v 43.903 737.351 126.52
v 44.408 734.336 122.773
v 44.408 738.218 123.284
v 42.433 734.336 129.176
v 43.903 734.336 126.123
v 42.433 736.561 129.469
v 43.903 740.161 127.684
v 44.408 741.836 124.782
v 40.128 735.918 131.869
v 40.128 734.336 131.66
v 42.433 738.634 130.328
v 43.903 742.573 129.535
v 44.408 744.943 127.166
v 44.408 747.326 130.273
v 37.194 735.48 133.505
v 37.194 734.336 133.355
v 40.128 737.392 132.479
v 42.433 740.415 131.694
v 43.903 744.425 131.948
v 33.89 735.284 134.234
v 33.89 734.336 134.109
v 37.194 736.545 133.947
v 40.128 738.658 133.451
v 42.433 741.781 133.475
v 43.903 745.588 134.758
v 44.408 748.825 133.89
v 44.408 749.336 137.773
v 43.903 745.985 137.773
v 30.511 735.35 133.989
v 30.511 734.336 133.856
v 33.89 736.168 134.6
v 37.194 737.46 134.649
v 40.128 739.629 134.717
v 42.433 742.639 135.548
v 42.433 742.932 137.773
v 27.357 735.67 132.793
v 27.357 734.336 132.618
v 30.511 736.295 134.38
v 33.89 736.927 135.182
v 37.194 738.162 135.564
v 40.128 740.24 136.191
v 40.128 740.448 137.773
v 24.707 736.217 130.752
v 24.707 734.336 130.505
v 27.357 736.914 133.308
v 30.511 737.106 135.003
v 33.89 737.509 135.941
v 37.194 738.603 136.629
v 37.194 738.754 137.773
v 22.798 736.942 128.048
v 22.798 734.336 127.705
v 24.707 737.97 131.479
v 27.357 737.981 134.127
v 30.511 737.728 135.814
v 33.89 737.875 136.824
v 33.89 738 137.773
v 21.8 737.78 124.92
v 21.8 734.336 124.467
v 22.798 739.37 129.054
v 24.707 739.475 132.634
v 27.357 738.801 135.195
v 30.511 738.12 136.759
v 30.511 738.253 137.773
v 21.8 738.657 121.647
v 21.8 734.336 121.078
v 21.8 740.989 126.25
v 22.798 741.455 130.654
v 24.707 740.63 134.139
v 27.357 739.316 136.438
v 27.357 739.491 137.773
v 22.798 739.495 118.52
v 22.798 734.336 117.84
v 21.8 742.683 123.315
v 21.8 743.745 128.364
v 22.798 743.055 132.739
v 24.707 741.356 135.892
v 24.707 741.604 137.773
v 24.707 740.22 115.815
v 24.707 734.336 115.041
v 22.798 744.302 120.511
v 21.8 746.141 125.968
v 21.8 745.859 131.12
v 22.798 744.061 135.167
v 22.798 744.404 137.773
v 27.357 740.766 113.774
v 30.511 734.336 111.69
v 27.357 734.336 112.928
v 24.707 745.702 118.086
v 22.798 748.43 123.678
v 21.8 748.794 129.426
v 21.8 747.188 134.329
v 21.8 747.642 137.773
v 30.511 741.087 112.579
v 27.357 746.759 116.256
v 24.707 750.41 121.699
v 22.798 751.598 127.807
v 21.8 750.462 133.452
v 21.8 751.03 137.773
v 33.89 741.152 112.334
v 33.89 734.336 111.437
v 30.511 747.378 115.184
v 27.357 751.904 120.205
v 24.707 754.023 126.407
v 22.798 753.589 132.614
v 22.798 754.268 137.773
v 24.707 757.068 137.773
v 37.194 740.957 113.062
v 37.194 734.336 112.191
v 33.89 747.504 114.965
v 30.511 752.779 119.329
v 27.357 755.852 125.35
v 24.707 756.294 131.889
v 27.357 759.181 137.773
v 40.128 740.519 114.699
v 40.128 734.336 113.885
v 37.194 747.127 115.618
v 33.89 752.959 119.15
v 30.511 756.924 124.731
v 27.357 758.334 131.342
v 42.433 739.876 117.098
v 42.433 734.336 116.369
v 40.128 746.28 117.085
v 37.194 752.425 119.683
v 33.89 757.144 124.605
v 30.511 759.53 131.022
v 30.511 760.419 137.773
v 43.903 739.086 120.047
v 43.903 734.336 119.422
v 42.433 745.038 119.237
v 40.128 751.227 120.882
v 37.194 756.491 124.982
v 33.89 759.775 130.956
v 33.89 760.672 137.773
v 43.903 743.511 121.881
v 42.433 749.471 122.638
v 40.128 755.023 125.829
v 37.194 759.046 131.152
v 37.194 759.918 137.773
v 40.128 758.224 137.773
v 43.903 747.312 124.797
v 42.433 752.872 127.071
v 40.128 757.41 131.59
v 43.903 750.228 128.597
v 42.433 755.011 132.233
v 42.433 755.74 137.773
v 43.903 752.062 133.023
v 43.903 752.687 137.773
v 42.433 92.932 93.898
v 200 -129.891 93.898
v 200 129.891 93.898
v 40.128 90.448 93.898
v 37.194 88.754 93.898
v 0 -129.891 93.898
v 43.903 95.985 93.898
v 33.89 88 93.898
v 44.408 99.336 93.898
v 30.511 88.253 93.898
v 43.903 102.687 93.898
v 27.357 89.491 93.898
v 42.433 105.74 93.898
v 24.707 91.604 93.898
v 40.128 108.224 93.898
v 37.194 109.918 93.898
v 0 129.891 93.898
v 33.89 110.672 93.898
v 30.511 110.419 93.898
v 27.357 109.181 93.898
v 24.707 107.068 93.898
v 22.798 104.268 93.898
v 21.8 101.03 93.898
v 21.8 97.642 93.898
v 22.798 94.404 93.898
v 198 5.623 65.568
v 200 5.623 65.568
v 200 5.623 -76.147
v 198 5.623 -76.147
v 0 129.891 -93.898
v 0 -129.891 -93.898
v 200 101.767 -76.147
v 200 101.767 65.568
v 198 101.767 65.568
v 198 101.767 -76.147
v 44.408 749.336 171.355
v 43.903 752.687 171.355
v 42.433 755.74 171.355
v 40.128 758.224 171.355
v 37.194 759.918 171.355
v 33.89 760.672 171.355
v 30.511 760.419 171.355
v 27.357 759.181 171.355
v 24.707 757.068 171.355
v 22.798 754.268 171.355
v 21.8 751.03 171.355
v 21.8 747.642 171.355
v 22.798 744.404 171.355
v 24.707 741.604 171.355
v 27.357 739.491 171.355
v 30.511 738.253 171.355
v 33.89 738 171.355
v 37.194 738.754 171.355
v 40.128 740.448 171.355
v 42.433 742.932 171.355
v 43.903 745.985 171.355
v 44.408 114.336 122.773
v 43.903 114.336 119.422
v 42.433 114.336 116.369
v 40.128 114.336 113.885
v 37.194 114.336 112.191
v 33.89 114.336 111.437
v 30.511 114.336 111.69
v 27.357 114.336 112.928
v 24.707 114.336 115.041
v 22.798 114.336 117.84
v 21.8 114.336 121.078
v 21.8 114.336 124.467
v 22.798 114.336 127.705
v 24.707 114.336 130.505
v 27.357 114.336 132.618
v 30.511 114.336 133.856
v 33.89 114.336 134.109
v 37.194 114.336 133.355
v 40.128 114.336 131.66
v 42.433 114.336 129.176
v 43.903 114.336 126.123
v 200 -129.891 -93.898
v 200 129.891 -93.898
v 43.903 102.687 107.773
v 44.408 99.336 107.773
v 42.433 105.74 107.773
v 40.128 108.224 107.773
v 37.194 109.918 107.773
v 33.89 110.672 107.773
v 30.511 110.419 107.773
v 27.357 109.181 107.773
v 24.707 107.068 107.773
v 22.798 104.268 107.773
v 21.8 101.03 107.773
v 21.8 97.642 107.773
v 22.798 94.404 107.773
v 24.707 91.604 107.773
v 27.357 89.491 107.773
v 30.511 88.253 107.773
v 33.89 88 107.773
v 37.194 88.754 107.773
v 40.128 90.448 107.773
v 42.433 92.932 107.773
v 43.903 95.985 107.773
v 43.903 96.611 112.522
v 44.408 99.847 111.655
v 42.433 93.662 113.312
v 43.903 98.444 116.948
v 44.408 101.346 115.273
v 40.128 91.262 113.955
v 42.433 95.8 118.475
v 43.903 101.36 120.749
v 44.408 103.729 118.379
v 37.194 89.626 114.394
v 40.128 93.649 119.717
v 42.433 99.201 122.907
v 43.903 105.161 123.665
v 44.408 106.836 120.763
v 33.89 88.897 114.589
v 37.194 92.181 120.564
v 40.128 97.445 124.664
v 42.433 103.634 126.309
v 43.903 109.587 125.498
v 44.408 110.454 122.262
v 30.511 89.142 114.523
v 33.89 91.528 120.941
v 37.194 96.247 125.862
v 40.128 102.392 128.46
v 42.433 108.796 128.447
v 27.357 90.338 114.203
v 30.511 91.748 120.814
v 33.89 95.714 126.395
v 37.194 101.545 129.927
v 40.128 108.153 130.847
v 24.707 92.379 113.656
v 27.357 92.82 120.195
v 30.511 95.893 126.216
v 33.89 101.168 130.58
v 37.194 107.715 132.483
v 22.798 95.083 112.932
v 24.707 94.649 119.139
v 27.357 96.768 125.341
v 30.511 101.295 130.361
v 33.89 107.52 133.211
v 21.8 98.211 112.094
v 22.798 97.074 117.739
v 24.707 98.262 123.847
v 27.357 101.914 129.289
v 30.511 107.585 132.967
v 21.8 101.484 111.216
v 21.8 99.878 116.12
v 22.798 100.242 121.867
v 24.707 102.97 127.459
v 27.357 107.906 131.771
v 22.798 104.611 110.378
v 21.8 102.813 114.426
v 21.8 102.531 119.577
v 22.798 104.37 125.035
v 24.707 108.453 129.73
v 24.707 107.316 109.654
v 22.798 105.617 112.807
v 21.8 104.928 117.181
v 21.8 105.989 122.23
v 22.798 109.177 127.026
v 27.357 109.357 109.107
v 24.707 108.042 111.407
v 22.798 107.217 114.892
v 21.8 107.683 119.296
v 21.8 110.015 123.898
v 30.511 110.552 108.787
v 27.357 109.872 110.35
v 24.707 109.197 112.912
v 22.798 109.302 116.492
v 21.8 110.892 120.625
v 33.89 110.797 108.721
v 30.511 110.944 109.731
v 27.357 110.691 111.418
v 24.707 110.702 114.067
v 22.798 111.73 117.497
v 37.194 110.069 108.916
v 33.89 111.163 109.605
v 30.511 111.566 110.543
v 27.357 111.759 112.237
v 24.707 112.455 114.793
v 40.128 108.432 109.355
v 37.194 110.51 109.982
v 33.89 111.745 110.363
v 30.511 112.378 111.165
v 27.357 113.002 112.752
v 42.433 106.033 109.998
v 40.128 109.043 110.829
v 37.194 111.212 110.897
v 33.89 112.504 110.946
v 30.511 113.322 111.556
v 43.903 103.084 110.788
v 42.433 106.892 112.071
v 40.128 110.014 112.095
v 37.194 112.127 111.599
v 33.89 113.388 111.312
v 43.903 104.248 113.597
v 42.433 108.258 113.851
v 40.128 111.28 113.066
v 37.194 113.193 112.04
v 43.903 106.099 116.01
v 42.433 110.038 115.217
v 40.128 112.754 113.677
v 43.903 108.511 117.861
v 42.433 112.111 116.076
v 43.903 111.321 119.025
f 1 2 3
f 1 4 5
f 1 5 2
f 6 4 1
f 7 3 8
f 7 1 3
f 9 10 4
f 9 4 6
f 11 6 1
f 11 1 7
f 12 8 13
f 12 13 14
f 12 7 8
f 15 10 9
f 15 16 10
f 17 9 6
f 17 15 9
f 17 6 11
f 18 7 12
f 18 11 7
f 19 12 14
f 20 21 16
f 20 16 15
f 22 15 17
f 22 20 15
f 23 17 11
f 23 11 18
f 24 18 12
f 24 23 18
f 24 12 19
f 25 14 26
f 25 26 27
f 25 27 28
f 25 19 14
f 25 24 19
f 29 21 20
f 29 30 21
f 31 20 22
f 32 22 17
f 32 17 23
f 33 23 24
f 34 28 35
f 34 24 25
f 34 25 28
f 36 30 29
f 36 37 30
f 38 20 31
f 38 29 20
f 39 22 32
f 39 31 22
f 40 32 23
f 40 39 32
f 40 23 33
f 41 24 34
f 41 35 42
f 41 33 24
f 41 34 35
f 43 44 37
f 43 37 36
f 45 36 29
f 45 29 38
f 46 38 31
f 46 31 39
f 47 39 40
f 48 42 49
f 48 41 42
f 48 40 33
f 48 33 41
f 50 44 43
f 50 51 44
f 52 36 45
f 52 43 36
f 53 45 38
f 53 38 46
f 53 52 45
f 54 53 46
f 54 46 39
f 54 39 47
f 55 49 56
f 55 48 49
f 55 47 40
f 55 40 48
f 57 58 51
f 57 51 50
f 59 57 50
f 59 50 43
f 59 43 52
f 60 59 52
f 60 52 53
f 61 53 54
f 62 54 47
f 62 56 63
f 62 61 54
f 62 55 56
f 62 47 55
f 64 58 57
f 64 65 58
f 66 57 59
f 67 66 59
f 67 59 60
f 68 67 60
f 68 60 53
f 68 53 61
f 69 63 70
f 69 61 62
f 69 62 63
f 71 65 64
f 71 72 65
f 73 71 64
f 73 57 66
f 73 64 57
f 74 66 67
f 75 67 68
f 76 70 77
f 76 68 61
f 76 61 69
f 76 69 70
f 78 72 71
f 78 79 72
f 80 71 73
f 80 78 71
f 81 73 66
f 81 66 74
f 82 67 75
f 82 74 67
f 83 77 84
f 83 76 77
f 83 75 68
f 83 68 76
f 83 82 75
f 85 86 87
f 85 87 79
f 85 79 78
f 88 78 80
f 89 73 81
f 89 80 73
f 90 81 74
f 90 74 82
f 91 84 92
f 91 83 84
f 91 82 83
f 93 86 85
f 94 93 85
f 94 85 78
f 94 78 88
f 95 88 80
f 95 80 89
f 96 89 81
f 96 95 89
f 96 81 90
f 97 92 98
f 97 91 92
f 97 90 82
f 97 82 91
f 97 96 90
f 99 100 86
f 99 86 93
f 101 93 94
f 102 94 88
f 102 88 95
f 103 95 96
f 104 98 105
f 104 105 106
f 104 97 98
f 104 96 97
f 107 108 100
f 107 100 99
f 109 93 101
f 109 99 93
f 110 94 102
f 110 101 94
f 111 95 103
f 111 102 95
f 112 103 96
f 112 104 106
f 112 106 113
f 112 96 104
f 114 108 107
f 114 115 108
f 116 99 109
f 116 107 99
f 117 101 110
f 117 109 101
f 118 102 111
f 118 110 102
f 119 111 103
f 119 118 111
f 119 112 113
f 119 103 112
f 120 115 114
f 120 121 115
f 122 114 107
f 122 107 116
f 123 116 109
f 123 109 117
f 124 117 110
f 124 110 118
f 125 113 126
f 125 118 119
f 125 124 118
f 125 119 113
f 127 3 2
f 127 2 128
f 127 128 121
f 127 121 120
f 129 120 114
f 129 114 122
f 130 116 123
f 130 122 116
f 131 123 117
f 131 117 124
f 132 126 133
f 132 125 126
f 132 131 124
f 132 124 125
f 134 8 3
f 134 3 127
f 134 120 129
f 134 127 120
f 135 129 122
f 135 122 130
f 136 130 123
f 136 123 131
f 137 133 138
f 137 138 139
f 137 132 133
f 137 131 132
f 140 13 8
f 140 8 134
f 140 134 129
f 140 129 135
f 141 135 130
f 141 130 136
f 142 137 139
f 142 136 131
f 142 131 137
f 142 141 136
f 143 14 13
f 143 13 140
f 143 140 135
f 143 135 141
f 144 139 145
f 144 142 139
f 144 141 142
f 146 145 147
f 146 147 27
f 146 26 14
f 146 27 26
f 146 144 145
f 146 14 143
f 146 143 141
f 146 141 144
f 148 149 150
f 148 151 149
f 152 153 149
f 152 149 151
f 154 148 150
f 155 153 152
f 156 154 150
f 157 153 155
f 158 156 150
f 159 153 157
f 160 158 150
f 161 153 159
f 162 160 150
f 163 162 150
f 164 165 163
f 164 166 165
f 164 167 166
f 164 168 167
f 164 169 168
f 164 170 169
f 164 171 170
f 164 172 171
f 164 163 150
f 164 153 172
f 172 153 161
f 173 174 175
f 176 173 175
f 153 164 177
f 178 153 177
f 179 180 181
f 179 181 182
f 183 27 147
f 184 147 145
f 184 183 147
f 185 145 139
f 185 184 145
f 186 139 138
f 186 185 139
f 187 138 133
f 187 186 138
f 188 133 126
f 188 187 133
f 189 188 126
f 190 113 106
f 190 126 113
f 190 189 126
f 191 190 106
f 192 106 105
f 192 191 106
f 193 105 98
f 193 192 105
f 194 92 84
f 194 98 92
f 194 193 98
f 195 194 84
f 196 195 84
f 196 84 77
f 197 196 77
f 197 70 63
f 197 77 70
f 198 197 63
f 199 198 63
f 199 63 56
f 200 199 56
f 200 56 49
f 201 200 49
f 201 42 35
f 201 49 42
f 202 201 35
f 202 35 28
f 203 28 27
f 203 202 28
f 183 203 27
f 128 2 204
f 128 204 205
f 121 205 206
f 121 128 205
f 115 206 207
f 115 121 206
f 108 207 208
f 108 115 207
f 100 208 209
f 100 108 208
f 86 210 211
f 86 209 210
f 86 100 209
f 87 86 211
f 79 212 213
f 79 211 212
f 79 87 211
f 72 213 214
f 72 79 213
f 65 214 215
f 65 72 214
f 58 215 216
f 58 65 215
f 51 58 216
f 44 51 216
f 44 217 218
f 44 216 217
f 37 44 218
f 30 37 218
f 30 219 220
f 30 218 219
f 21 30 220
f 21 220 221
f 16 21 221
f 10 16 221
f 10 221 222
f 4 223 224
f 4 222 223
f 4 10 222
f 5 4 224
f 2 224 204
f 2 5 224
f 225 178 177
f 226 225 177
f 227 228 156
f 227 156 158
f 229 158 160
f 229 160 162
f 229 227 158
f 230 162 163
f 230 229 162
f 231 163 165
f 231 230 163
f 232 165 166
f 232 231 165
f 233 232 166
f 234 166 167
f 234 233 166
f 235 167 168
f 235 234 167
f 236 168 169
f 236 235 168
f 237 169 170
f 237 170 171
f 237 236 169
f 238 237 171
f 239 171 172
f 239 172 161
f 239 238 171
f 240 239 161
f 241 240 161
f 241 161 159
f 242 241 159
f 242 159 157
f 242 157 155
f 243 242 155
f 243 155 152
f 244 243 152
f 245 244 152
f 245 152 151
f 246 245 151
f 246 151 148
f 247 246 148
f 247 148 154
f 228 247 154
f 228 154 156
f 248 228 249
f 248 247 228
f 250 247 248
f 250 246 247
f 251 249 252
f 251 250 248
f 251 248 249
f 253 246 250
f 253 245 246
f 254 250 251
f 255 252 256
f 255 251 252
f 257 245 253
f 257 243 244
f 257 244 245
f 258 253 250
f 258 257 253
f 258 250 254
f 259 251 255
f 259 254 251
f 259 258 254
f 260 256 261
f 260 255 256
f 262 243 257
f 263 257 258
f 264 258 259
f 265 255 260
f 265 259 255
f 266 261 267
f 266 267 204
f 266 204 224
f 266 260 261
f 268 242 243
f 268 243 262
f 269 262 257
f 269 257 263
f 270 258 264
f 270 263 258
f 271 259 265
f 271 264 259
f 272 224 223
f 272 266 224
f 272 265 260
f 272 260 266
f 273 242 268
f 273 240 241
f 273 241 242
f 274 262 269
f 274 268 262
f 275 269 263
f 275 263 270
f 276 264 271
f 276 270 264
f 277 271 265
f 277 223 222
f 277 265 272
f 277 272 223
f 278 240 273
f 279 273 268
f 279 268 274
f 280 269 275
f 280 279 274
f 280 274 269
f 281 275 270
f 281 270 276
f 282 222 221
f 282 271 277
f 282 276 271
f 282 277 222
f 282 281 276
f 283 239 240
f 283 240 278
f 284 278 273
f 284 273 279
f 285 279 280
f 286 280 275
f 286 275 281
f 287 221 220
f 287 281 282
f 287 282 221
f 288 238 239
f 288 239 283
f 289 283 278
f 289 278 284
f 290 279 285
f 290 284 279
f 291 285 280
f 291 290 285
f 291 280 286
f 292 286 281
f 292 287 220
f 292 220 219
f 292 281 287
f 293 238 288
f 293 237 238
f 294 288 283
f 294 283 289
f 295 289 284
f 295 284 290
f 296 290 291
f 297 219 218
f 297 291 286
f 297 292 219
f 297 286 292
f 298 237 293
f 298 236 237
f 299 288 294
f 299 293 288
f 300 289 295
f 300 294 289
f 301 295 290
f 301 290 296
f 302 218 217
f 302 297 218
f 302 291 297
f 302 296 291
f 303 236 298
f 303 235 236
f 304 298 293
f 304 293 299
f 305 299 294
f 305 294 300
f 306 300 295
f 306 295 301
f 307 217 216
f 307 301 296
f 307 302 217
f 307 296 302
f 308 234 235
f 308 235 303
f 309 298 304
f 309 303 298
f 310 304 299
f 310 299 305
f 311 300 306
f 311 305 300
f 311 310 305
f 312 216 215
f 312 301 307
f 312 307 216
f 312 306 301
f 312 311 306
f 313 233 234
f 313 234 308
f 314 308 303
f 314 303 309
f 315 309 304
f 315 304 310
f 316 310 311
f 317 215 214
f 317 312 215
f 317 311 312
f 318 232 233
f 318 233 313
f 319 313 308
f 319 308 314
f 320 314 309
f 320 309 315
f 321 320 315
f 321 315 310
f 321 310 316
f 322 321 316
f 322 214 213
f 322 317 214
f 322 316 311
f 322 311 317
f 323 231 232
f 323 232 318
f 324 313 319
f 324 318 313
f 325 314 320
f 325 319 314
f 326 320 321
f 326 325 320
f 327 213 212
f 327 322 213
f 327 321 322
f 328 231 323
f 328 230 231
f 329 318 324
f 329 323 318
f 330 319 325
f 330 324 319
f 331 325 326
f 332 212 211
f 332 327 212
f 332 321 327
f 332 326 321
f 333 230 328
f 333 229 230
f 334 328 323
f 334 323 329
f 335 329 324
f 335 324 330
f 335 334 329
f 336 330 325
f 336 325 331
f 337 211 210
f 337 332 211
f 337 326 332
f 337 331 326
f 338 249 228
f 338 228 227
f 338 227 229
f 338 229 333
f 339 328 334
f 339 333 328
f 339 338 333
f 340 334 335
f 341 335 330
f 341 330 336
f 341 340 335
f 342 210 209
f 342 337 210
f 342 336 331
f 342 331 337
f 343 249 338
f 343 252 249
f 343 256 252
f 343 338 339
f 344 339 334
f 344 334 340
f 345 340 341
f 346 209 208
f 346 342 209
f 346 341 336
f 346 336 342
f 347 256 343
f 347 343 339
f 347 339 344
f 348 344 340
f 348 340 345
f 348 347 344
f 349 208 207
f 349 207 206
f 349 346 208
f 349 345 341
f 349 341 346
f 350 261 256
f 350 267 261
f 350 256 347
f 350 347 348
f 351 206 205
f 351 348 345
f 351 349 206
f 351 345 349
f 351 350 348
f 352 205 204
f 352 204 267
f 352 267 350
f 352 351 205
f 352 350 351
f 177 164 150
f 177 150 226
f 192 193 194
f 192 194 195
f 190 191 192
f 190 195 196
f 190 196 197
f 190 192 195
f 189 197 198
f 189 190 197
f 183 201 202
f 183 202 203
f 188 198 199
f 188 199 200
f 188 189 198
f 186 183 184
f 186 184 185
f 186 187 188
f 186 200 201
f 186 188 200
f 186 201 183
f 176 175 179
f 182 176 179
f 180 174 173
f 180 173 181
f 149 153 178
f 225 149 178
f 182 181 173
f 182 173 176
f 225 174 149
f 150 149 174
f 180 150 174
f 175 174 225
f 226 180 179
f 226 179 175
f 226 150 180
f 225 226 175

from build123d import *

# Parameters (mm, degrees)
SKETCH1_W           = 187.796310486
SKETCH1_H           = 259.782504146
BOSS_EXTRUDE1_DEPTH = 200
SKETCH2_W           = 141.715117515
SKETCH2_H           = 96.14369286
CUT_EXTRUDE1_DEPTH  = 2
SKETCH3_R           = 11.367887844


with BuildPart() as part:
    # Sketch1 → Boss-Extrude1 (new body)
    with BuildSketch(Plane(origin=(0, 0, 0), x_dir=(0, 0, -1), z_dir=(1, 0, 0))):
        Rectangle(SKETCH1_W, SKETCH1_H)
    extrude(amount=BOSS_EXTRUDE1_DEPTH)

    # Sketch2 → Cut-Extrude1 (cut)
    with BuildSketch(Plane(origin=(200, 0, 0), x_dir=(0, 0, -1), z_dir=(1, 0, 0))):
        with Locations((5.289494402, 53.694775969)):
            Rectangle(SKETCH2_W, SKETCH2_H)
    extrude(amount=-CUT_EXTRUDE1_DEPTH, mode=Mode.SUBTRACT)

    # Sweep3: sweep along a curve in space
    with BuildLine() as sweep3_path:
        Line((33.040603642, 99.336066007, 93.898155243), (33.040603642, 99.336066007, 107.772716538))
        ThreePointArc((33.040603642, 114.336066007, 122.772716538), (33.040603642, 103.729464289, 118.379318255), (33.040603642, 99.336066007, 107.772716538))
        Line((33.040603642, 114.336066007, 122.772716538), (33.040603642, 734.336066007, 122.772716538))
        ThreePointArc((33.040603642, 734.336066007, 122.772716538), (33.040603642, 744.942667725, 127.16611482), (33.040603642, 749.336066007, 137.772716538))
        Line((33.040603642, 749.336066007, 137.772716538), (33.040603642, 749.336066007, 171.355386401))
    # Sketch3 → Sweep3 (sweep)
    with BuildSketch(Plane.XY.offset(93.898155243)):
        with Locations((33.040603642, 99.336066007)):
            Circle(SKETCH3_R)
    sweep(path=sweep3_path.line)


solid = part.part
